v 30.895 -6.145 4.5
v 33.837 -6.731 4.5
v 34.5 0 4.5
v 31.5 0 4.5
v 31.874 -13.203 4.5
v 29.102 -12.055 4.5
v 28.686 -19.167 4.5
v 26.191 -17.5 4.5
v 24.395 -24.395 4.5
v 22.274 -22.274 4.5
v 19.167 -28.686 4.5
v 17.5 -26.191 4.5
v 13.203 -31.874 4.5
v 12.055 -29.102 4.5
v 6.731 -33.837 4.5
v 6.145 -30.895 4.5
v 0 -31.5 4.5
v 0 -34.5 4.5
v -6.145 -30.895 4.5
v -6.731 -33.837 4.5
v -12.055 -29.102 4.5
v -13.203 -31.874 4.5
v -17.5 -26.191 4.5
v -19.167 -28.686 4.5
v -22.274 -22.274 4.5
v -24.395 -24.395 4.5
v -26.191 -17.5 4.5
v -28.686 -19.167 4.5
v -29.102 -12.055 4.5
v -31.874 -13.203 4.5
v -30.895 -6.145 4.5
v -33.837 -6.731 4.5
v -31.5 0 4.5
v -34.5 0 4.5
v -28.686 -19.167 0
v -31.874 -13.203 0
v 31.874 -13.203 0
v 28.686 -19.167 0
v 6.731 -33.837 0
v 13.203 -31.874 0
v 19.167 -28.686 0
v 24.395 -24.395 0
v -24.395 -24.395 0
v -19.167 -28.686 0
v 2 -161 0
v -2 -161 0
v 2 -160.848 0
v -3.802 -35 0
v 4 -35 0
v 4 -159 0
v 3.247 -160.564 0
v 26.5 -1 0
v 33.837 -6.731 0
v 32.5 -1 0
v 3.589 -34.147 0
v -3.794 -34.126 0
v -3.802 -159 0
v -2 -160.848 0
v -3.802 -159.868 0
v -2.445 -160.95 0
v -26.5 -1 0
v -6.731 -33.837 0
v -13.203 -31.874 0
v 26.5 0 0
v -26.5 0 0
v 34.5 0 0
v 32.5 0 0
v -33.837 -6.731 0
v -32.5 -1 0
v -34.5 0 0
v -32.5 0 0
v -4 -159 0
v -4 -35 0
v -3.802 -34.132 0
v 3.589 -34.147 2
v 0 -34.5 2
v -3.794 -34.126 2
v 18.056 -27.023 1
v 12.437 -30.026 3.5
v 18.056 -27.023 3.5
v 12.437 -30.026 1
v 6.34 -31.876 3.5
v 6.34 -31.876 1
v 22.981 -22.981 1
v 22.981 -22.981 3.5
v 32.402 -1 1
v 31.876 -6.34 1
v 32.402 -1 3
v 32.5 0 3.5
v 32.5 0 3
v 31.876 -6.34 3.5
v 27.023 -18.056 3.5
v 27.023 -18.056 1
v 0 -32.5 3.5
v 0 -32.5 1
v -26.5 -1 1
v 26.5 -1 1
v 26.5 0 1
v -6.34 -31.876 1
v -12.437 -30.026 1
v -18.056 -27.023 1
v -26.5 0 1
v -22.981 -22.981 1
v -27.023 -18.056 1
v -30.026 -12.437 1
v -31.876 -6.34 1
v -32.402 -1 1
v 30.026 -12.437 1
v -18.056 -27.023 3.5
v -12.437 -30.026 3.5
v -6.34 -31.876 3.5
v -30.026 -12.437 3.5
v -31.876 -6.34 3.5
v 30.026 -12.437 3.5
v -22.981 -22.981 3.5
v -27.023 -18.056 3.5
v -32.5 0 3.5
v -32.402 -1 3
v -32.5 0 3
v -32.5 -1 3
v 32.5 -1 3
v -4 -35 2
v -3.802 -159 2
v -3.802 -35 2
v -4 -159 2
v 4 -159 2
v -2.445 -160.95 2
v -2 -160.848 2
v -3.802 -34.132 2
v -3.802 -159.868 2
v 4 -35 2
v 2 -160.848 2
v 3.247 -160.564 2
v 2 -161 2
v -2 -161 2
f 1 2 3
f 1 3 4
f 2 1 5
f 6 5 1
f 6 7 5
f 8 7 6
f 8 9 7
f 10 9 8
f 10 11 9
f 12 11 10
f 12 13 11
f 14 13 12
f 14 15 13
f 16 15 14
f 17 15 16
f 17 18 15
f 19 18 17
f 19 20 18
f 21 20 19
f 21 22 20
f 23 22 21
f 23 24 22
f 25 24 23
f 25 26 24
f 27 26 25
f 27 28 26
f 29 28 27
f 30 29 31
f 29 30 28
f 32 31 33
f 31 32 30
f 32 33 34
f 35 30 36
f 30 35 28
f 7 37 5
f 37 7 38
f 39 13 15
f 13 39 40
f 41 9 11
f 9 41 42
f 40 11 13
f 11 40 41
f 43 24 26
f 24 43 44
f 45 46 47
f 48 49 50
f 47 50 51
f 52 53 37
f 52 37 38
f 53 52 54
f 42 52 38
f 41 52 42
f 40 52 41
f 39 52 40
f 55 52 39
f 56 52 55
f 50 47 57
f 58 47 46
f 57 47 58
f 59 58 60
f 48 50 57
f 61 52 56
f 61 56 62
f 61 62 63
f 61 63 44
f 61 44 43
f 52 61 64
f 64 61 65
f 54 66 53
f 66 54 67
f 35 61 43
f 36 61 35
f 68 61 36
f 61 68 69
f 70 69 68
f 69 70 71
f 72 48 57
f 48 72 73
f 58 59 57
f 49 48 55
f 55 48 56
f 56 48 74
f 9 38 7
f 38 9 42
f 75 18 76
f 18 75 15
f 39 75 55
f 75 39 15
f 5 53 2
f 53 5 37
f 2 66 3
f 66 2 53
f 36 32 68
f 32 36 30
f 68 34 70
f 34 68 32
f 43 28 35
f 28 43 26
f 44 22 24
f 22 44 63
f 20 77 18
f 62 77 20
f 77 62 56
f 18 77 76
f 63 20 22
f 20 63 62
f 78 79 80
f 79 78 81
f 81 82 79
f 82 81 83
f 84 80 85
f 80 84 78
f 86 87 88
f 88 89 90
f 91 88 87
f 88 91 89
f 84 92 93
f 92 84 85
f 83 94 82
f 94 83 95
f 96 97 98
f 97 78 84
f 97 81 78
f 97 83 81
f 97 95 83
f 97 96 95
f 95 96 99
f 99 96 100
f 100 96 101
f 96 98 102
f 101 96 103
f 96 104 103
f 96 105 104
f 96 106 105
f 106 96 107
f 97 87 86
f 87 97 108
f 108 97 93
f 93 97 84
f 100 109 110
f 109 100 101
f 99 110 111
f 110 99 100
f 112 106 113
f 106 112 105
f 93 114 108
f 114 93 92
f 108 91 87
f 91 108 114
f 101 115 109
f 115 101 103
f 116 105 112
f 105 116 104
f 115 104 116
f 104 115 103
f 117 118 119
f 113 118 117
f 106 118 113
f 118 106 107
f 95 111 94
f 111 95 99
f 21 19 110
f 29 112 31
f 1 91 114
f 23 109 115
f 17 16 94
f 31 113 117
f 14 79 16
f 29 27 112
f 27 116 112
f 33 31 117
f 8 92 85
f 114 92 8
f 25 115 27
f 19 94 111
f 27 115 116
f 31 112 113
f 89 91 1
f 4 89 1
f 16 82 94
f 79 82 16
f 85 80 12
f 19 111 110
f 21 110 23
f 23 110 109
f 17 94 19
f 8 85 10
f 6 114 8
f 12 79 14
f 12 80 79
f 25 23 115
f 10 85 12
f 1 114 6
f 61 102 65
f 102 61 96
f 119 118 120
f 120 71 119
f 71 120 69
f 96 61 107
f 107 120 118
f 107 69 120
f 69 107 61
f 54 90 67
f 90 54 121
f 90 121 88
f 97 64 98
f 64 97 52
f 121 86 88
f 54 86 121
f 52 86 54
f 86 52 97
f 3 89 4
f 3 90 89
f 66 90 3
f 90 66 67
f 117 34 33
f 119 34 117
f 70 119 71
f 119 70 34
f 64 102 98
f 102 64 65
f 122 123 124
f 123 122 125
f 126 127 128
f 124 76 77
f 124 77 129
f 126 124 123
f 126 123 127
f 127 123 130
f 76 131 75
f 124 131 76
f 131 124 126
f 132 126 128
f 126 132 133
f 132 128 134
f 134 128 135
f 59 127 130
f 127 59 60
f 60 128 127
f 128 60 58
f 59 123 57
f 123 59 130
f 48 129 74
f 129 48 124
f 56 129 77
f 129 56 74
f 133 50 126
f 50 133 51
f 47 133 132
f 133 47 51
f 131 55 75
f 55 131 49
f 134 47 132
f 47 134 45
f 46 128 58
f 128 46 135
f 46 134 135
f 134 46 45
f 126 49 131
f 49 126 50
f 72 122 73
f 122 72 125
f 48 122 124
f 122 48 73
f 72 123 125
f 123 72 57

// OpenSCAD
// file: spider_web_generator.scad
smallest_radius = 20;
strands = 6;
width = 0.8;
height = 2.5;
wedges = 8;
strand_fn = 64;
scale = 1;
twist = 0;

module star(radius, wedges, strand_fn) {
	angle = 360 / wedges;
	difference() {
		circle(radius, $fn = wedges);
		for(i = [0:wedges - 1]) {
			rotate(angle / 2 + angle * i) translate([radius, 0, 0]) 
			    scale([0.8, 1, 1]) 
				    circle(radius * sin(angle / 2), $fn = strand_fn);
		}
	}
}

module frame(width) {
    difference() {
        children();
        offset(r = -width) children();
    }
}

module spider_web(smallest_radius, strands, width, height, wedges, strand_fn) {
	for(i = [0:strands - 1]) {
		frame(width) star(smallest_radius * i, wedges, strand_fn);
	}

	angle = 360 / wedges;
	
	for(i = [0:wedges - 1]) {
		rotate(angle * i) translate([0, -width / 2, 0]) 
			square([smallest_radius * strands, width]);
	}
}

//linear_extrude(height, scale = scale, twist = twist)     spider_web(smallest_radius, strands, width, height, wedges, strand_fn);

module lines(lines, z) {
	for (cx = [1:len(lines) - 1]) {
		translate([0, 0, z / 2])
		hull() {
			translate([lines[cx - 1][0], lines[cx - 1][1], 0])	sphere(z / 2, $fn = 8);
			translate([lines[cx][0], lines[cx][1], 0])			sphere(z / 2, $fn = 8);
		}
	}
}
module generate_spider_web(x, y, z, wedges, circles) {
	margin = 0 / 2;
	lines([
		[margin,		margin],
		[x - margin,	margin],
		[x - margin,	y - margin],
		[margin,		y - margin],
		[margin,		margin]
	], z);
	radians = [for (cx = [0:wedges - 1]) 360 / wedges * cx];
	radiuses = [for (cx = [1:circles]) x / circles * cx];
	echo (radians, radiuses);
	for (cx = [0:len(radians) - 1]) {
		lines([
			[0,		0],
			[x * sin(radians[cx]) / 2,	y * cos(radians[cx]) / 2]
		], z);
	}
	for (cx = [0:len(radiuses) - 1]) {
		difference() {
			circle(radiuses[cx] / 2, $fn = 128);
			circle(radiuses[cx] / 2 - z, $fn = 128);
		}
	}
}
generate_spider_web(32, 16, 1, 23, 4);
// main file
use <MCAD/boxes.scad>
use <spider_web_generator.scad>

ZERO = [0, 0, 0];
// 상수
SIZE = 24;

module mark(name, height, size = 2) {
	linear_extrude(height, center = true)	text(name, size = size);
}
//mark("010-6810-6479", 1);
module lines2(first, second, height, size = 1) {
	cube([size * 7.5, size * 3, height / 3]);
	for (dx = [0:0.01:0.1]) {
		translate([size / 2 + dx, size * 0.6, 0])	{
			color([0, 0, 1, 1])	translate([0, size * 1.2, 0])	linear_extrude(height, center = false)	text(first, size = size / 2);
			color([0, 0, 1, 1])	translate([0, 0, 0])				linear_extrude(height, center = false)	text(second, size = size);
		}
	}
	translate([size / 2, size * 0.6, 0])	{
		color([0, 0, 1, 1])	translate([0, size * 1.2, 0])	linear_extrude(height, center = false)	text(first, size = size / 2);
		color([0, 0, 1, 1])	translate([0, 0, 0])				linear_extrude(height, center = false)	text(second, size = size);
	}
	translate([size / 2 + 0.05, size * 0.6, 0])	{
		color([0, 0, 1, 1])	translate([0, size * 1.2, 0])	linear_extrude(height, center = false)	text(first, size = size / 2);
		color([0, 0, 1, 1])	translate([0, 0, 0])				linear_extrude(height, center = false)	text(second, size = size);
	}
}

module andold() {
	base = [8, 3, 1];
	lines2("010", "6810-6479", 1);
}
//andold();

module textBold(title, size, font) {
	for (cx = [0: 0.01: size / 10]) {
		translate([cx, 0, 0])		text(title, size, font = font);
	}
}
module themeCircle(number0, number1, number2, radius = 16, prototype = true) {
	thick = 2;
	size = radius / 4 * 1.33;
	font = "Sans Serif:style=Bold";
	widthBaseline = 2;
	slices = prototype ? 20 : thick * 16;
	fn = prototype ? 32 : 256;

	translate([radius, radius, 0]) {
		linear_extrude(height = thick, center = false, convexity = 10, twist = 0, slices = slices, scale=[1, 1], $fn = fn) {
			//	원
			difference() {
				circle(radius);
				circle(radius - 4);
			}
			intersection() {
				circle(radius);
				import(file = "web.svg", dpi = 96 * 2, center = true);
			}
			
			//	전화번호
			translate([size / 2 - radius + size, size + widthBaseline / 2, 0])		textBold(number0, size / 3 * 2, font);
			translate([size / 2 - radius + size, -size / 2 + widthBaseline / 2, 0])	textBold(number1, size, font);
			translate([size / 2 - radius + size, -size * 2 + widthBaseline / 2, 0])	textBold(number2, size, font);
		}
		
		//	베이스라인
		scale(ZERO)	linear_extrude(thick / 2, true) {
			translate([-radius * 0.85,	size, 1 / 2])			square([radius * 2 * 0.85, widthBaseline], false);
			translate([-radius * 0.90,	-size / 2, 1 / 2])		square([radius * 2 * 0.90, widthBaseline], false);
			translate([-radius * 0.70,	-size / 2 * 4, 1 / 2])	square([radius * 2 * 0.70, widthBaseline], false);
		}
	}
	
	//	손잡이?
	translate([radius - thick / 4, -128 / 2 + thick, thick / 4])	roundedBox([thick * 2, 128, thick / 2], thick / 4, true);
}

module themeCircleCap(radius, thick, prototype) {
	margin = thick / 4;
	inner = radius + margin;
	outter = radius + margin + thick;
	padding = thick * 3;
	fn = prototype ? 32 : 256;
	difference() {
		color("white", 0.8)
			translate([0, 0, 0])
			cylinder(h = thick * 2 + margin, r1 = outter, r2 = outter, center = false, $fn = fn);
		// 넣는 장소
		translate([0, 0, thick / 2])
			cylinder(h = thick + margin, r1 = inner, r2 = inner, center = false, $fn = fn);
		// 가두는 테두리
		translate([0, 0, thick / 2 * 3 + margin])
			cylinder(h = thick / 2, r1 = inner, r2 = radius - thick / 4, center = false, $fn = fn);

		// 살짝 걸치는 곳
		translate([-inner, -thick / 2, -thick / 2])
			cube([padding, thick, thick * 2]);
		translate([inner - padding, -thick / 2, -thick / 2])
			cube([padding, thick, thick * 2]);

		// 반원으로 자르기
		translate([-outter, 0, -thick / 2])
			cube([outter * 2, outter * 2, thick * 4]);
	}
	
	// 손잡이
	stickx = thick * 4;
	sticky = 128;
	stickz = thick;
	translate([0, -sticky / 2 - radius - thick / 2, stickz / 2])
		roundedBox([stickx, sticky, stickz], thick, true);
}

module themeCircleWeb(number0, number1, number2, radius, thick, prototype) {
	echo("themeCircleWeb start: ", number0, number1, number2, radius, thick, prototype);
	size = (radius - thick) * 2 / 8.5;
	font = "나눔고딕:style=Normal";
	padding = thick * 2;
	slices = prototype ? 20 : thick * 16;
	fn = prototype ? 32 : 256;

	translate([radius, radius, 0]) {
		linear_extrude(height = thick / 2, center = false, convexity = 10, twist = 0, slices = slices, scale=[1, 1], $fn = fn) {
			intersection() {
				circle(radius);
				offset(0.1)
					//resize([radius * 2, radius * 2])
					import(file = "web.svg", dpi = 96, center = true);
			}
		}
		linear_extrude(height = thick, center = false, convexity = 10, twist = 0, slices = slices, scale=[1, 1], $fn = fn) {
			//	원
			difference() {
				circle(radius);
				circle(radius - padding);
			}

			//	전화번호
			offset(0.4)
				translate([-radius + thick + size * 2,	size / 2 * 4.5, 0])
				text(number0, size / 3 * 2, font);
			offset(0.6)
				translate([-radius + thick + size * 0.75,		size / 2 * 1.5, 0])
				text(number1, size, font);

			rotate([0, 0, 180]) {
				offset(0.4)
					translate([-radius + thick + size * 2,	size / 2 * 4.5, 0])
					text(number0, size / 3 * 2, font);
				offset(0.6)
					translate([-radius + thick + size * 0.75, size / 2 * 1.5, 0])
					text(number2, size, font);
			}
		}
		color("blue", 0.8)
			translate([-radius, -thick / 2, thick])
			cube([padding, thick, thick]);
		color("blue", 0.8)
			translate([radius - padding, -thick / 2, thick])
			cube([padding, thick, thick]);
	}
	
	echo("themeCircleWeb done: ", number0, number1, number2, radius, thick, prototype);
}

target = 1;
radius = 32;
thick = 2;
prototype = true;
module build(target, thick, prototype, radius) {
	echo("build start: ", target, thick, prototype, radius);

	if (target == 1) {
		themeCircleCap(
			(radius == undef) ? 32 : radius,
			(thick == undef) ? 2 : thick,
			(prototype == undef) ? true : prototype
		);
	} else if (target == 2) {
		themeCircleWeb("010", "6810 6479", "4240 6479",
			(radius == undef) ? 32 : radius,
			(thick == undef) ? 2 : thick,
			(prototype == undef) ? true : prototype
		);
	}

	echo("build done: ", target, thick, prototype, radius);
}

build(target, thick, prototype, radius);
